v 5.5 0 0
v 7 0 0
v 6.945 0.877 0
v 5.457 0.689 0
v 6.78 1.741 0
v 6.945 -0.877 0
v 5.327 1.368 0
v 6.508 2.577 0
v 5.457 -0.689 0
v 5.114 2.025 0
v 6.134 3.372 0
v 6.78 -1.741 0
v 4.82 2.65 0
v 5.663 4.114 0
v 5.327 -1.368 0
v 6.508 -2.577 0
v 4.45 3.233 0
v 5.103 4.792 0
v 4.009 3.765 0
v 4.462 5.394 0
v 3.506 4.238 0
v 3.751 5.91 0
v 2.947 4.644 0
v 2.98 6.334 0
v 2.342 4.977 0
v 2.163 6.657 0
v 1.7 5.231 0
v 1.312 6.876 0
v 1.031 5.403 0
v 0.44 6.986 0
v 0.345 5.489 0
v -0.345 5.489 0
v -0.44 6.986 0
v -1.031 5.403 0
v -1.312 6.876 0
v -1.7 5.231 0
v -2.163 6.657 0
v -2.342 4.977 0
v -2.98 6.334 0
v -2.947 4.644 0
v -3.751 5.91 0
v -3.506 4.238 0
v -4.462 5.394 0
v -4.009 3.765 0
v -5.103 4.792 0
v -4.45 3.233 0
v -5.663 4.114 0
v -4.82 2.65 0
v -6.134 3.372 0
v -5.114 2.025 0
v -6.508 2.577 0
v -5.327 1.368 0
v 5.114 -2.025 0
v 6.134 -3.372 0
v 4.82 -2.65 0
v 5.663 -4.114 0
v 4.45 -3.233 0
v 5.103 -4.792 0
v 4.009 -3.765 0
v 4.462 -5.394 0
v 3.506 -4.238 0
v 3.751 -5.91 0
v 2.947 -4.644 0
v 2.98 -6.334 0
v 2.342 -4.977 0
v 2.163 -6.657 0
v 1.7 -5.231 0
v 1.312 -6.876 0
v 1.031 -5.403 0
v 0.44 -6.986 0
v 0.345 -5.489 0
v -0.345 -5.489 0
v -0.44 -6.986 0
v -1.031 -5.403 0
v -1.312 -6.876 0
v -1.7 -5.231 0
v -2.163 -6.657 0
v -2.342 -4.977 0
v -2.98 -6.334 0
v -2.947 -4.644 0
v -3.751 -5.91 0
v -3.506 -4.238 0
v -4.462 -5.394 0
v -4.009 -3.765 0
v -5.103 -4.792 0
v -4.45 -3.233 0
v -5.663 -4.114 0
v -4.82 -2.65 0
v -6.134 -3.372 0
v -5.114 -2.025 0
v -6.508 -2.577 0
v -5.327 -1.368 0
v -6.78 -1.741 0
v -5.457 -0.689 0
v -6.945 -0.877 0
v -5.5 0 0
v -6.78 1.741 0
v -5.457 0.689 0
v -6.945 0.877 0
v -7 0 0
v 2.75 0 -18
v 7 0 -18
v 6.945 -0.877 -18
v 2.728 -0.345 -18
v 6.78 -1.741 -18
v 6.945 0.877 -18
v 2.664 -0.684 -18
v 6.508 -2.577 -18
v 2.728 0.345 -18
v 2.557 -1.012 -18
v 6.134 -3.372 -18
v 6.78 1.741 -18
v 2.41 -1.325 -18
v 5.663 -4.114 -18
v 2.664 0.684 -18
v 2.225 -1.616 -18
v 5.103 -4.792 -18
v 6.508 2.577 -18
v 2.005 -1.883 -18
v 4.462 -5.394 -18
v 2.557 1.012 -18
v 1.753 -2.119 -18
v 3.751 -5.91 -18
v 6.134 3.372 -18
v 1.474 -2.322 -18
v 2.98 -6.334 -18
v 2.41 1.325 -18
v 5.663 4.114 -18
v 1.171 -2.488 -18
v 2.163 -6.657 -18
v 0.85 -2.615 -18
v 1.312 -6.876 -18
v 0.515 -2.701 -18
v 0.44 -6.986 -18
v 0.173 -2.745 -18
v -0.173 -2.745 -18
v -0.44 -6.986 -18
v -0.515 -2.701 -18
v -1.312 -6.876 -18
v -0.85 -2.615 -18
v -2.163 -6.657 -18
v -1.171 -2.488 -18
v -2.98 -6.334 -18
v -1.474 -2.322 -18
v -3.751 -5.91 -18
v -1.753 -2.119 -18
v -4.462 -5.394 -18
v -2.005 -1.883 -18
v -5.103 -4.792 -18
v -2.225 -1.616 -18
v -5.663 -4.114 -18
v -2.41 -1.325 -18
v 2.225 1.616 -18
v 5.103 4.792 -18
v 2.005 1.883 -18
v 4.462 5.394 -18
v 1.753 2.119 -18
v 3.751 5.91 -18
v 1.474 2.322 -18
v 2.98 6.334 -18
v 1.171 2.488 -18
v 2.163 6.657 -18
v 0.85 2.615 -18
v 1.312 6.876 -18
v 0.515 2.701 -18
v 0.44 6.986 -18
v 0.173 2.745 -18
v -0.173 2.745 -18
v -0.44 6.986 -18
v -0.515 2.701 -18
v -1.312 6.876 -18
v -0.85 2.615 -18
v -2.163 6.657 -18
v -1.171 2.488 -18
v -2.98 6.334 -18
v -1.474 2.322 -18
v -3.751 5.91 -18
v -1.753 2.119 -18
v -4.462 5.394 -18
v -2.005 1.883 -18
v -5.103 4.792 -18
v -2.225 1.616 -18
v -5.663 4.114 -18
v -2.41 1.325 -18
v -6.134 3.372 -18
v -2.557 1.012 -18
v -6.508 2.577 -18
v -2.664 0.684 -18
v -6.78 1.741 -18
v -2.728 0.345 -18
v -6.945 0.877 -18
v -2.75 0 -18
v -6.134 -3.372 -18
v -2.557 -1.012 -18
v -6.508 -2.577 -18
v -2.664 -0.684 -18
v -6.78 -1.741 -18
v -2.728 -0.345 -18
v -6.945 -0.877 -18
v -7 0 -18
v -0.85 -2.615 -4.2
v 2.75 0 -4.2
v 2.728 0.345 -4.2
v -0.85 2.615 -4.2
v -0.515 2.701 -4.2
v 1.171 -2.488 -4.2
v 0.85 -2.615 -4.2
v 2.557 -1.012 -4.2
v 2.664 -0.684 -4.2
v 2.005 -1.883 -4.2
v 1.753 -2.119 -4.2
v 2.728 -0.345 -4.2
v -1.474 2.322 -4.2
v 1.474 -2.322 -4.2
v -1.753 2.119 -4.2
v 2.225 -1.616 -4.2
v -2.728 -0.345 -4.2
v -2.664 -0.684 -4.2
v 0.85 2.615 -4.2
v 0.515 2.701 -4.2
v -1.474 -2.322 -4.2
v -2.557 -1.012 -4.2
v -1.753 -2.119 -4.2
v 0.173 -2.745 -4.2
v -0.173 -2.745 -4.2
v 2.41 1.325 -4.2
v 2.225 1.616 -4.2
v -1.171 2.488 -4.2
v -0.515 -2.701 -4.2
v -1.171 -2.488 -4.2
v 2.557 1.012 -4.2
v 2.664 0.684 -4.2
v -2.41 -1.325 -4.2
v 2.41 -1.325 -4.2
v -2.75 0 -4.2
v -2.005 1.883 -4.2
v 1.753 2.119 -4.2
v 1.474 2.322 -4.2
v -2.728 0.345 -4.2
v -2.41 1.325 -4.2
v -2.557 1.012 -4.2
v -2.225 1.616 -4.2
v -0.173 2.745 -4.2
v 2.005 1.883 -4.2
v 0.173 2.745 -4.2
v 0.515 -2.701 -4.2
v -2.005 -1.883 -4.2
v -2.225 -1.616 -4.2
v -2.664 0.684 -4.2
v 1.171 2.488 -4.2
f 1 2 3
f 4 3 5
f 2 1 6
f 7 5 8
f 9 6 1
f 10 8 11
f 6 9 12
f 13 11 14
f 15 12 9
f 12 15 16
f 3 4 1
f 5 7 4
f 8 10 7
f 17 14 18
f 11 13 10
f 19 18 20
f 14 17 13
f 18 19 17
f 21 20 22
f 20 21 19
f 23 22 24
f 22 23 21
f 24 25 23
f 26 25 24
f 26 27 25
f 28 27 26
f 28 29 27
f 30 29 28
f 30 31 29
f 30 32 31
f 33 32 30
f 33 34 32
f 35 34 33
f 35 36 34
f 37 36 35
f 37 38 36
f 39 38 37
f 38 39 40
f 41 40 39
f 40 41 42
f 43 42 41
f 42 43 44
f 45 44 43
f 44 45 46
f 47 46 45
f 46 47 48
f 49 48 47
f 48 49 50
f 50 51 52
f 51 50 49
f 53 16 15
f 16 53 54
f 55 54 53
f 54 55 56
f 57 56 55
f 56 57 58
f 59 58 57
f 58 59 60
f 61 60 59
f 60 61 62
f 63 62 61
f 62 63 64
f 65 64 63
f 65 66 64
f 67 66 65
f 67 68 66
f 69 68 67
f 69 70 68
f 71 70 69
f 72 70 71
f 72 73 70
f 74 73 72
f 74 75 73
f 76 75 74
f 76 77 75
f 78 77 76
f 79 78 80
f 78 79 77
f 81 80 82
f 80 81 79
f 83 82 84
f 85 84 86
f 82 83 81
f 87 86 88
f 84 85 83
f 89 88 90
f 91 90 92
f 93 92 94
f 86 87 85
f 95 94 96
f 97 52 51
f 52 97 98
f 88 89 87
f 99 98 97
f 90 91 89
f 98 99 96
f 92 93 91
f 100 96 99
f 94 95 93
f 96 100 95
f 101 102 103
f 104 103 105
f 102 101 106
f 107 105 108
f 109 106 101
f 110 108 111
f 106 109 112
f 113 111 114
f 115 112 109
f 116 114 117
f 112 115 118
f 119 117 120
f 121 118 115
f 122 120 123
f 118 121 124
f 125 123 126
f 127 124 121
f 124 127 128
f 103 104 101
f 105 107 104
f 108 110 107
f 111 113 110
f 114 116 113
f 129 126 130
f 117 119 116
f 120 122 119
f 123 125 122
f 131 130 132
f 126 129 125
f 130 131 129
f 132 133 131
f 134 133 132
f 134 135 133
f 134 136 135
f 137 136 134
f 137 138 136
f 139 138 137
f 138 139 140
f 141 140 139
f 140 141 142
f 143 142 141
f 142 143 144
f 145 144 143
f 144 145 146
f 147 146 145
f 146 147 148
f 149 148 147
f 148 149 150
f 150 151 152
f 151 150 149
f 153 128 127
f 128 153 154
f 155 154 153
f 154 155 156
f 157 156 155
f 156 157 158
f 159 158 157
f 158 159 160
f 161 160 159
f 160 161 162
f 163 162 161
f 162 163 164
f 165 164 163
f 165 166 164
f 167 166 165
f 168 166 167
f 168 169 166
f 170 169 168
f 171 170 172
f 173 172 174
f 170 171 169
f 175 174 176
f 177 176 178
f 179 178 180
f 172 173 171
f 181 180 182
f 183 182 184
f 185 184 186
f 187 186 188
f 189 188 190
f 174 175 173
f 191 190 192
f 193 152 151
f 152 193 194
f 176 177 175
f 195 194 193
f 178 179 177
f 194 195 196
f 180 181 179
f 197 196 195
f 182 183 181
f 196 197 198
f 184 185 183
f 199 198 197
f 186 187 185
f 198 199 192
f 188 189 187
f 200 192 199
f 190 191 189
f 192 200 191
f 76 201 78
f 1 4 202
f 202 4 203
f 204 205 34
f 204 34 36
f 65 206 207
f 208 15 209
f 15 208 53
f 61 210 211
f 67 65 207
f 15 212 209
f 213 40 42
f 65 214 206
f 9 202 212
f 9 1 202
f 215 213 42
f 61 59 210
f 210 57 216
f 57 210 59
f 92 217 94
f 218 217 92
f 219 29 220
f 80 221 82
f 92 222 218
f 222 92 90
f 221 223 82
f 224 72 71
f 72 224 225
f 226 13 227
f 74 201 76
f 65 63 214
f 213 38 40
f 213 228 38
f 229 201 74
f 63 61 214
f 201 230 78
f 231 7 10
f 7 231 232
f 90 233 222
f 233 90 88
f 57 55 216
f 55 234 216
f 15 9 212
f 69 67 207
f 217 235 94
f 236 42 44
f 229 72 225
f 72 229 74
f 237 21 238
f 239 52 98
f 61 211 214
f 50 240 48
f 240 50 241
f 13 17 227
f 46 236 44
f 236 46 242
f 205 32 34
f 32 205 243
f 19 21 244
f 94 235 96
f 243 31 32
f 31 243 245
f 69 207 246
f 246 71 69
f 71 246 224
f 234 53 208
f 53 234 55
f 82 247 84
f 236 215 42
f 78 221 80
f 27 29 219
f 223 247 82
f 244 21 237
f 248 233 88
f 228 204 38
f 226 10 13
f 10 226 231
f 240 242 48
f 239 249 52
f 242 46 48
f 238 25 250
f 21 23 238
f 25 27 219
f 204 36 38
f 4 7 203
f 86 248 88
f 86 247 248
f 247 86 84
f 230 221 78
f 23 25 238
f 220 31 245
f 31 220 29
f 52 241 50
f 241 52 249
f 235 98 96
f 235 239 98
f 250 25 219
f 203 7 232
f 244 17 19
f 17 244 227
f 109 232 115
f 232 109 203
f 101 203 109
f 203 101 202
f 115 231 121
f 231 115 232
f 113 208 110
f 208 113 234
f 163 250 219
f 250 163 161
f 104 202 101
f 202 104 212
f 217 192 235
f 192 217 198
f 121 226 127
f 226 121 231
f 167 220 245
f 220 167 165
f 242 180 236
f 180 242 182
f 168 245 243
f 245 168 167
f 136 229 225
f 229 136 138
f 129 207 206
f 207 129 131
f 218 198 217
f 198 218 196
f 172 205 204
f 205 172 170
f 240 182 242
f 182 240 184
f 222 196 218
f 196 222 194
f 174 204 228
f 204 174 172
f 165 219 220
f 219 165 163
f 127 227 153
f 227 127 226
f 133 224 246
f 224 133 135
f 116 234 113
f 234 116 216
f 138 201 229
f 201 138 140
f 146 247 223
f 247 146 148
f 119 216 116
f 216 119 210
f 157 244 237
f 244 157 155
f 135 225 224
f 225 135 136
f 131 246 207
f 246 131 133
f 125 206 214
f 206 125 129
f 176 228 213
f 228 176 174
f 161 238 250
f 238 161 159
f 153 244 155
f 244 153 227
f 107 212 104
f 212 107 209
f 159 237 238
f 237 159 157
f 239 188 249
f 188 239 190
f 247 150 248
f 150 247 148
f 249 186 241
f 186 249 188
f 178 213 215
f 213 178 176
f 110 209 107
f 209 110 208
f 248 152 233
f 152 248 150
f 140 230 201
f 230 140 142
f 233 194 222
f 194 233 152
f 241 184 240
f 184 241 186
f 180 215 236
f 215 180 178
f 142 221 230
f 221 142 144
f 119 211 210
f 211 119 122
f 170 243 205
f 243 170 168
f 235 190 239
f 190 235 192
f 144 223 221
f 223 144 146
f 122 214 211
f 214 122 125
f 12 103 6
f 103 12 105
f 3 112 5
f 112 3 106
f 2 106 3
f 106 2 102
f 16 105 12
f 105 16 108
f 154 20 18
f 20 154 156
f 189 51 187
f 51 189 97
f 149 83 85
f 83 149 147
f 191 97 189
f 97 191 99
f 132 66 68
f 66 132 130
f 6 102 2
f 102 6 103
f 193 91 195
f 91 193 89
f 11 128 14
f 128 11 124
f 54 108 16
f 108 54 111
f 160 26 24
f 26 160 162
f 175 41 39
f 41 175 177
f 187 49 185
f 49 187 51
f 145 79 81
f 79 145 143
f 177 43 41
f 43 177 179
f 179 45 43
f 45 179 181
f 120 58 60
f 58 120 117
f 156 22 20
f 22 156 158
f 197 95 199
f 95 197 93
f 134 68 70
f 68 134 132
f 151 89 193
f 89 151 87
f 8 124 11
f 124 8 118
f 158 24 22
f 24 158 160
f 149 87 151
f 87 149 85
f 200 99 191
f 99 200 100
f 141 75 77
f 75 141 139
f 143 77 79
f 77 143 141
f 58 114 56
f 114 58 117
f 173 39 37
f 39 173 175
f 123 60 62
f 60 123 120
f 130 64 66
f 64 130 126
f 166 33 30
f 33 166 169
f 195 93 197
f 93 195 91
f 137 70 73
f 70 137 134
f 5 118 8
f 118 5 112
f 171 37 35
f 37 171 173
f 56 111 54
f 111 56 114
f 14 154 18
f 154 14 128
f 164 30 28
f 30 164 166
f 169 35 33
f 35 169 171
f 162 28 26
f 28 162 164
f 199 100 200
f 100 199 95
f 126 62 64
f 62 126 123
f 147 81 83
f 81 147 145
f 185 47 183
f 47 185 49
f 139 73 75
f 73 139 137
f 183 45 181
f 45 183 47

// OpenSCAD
$fn = 50;


difference() {
	union() {
		translate(v = [0, 0, -18.0000000000]) {
			cylinder(h = 18, r = 7.0000000000);
		}
		cylinder(h = 0, r = 17.0000000000);
	}
	union() {
		translate(v = [0, 0, 0]) {
			rotate(a = [0, 0, 0]) {
				difference() {
					union() {
						#translate(v = [0, 0, -18.0000000000]) {
							cylinder(h = 18, r = 2.2500000000);
						}
						#translate(v = [0, 0, -4.2000000000]) {
							cylinder(h = 4.2000000000, r1 = 2.7500000000, r2 = 5.5000000000);
						}
						#translate(v = [0, 0, -18.0000000000]) {
							cylinder(h = 18, r = 2.7500000000);
						}
						#translate(v = [0, 0, -18.0000000000]) {
							cylinder(h = 18, r = 2.2500000000);
						}
					}
					union();
				}
			}
		}
	}
}
